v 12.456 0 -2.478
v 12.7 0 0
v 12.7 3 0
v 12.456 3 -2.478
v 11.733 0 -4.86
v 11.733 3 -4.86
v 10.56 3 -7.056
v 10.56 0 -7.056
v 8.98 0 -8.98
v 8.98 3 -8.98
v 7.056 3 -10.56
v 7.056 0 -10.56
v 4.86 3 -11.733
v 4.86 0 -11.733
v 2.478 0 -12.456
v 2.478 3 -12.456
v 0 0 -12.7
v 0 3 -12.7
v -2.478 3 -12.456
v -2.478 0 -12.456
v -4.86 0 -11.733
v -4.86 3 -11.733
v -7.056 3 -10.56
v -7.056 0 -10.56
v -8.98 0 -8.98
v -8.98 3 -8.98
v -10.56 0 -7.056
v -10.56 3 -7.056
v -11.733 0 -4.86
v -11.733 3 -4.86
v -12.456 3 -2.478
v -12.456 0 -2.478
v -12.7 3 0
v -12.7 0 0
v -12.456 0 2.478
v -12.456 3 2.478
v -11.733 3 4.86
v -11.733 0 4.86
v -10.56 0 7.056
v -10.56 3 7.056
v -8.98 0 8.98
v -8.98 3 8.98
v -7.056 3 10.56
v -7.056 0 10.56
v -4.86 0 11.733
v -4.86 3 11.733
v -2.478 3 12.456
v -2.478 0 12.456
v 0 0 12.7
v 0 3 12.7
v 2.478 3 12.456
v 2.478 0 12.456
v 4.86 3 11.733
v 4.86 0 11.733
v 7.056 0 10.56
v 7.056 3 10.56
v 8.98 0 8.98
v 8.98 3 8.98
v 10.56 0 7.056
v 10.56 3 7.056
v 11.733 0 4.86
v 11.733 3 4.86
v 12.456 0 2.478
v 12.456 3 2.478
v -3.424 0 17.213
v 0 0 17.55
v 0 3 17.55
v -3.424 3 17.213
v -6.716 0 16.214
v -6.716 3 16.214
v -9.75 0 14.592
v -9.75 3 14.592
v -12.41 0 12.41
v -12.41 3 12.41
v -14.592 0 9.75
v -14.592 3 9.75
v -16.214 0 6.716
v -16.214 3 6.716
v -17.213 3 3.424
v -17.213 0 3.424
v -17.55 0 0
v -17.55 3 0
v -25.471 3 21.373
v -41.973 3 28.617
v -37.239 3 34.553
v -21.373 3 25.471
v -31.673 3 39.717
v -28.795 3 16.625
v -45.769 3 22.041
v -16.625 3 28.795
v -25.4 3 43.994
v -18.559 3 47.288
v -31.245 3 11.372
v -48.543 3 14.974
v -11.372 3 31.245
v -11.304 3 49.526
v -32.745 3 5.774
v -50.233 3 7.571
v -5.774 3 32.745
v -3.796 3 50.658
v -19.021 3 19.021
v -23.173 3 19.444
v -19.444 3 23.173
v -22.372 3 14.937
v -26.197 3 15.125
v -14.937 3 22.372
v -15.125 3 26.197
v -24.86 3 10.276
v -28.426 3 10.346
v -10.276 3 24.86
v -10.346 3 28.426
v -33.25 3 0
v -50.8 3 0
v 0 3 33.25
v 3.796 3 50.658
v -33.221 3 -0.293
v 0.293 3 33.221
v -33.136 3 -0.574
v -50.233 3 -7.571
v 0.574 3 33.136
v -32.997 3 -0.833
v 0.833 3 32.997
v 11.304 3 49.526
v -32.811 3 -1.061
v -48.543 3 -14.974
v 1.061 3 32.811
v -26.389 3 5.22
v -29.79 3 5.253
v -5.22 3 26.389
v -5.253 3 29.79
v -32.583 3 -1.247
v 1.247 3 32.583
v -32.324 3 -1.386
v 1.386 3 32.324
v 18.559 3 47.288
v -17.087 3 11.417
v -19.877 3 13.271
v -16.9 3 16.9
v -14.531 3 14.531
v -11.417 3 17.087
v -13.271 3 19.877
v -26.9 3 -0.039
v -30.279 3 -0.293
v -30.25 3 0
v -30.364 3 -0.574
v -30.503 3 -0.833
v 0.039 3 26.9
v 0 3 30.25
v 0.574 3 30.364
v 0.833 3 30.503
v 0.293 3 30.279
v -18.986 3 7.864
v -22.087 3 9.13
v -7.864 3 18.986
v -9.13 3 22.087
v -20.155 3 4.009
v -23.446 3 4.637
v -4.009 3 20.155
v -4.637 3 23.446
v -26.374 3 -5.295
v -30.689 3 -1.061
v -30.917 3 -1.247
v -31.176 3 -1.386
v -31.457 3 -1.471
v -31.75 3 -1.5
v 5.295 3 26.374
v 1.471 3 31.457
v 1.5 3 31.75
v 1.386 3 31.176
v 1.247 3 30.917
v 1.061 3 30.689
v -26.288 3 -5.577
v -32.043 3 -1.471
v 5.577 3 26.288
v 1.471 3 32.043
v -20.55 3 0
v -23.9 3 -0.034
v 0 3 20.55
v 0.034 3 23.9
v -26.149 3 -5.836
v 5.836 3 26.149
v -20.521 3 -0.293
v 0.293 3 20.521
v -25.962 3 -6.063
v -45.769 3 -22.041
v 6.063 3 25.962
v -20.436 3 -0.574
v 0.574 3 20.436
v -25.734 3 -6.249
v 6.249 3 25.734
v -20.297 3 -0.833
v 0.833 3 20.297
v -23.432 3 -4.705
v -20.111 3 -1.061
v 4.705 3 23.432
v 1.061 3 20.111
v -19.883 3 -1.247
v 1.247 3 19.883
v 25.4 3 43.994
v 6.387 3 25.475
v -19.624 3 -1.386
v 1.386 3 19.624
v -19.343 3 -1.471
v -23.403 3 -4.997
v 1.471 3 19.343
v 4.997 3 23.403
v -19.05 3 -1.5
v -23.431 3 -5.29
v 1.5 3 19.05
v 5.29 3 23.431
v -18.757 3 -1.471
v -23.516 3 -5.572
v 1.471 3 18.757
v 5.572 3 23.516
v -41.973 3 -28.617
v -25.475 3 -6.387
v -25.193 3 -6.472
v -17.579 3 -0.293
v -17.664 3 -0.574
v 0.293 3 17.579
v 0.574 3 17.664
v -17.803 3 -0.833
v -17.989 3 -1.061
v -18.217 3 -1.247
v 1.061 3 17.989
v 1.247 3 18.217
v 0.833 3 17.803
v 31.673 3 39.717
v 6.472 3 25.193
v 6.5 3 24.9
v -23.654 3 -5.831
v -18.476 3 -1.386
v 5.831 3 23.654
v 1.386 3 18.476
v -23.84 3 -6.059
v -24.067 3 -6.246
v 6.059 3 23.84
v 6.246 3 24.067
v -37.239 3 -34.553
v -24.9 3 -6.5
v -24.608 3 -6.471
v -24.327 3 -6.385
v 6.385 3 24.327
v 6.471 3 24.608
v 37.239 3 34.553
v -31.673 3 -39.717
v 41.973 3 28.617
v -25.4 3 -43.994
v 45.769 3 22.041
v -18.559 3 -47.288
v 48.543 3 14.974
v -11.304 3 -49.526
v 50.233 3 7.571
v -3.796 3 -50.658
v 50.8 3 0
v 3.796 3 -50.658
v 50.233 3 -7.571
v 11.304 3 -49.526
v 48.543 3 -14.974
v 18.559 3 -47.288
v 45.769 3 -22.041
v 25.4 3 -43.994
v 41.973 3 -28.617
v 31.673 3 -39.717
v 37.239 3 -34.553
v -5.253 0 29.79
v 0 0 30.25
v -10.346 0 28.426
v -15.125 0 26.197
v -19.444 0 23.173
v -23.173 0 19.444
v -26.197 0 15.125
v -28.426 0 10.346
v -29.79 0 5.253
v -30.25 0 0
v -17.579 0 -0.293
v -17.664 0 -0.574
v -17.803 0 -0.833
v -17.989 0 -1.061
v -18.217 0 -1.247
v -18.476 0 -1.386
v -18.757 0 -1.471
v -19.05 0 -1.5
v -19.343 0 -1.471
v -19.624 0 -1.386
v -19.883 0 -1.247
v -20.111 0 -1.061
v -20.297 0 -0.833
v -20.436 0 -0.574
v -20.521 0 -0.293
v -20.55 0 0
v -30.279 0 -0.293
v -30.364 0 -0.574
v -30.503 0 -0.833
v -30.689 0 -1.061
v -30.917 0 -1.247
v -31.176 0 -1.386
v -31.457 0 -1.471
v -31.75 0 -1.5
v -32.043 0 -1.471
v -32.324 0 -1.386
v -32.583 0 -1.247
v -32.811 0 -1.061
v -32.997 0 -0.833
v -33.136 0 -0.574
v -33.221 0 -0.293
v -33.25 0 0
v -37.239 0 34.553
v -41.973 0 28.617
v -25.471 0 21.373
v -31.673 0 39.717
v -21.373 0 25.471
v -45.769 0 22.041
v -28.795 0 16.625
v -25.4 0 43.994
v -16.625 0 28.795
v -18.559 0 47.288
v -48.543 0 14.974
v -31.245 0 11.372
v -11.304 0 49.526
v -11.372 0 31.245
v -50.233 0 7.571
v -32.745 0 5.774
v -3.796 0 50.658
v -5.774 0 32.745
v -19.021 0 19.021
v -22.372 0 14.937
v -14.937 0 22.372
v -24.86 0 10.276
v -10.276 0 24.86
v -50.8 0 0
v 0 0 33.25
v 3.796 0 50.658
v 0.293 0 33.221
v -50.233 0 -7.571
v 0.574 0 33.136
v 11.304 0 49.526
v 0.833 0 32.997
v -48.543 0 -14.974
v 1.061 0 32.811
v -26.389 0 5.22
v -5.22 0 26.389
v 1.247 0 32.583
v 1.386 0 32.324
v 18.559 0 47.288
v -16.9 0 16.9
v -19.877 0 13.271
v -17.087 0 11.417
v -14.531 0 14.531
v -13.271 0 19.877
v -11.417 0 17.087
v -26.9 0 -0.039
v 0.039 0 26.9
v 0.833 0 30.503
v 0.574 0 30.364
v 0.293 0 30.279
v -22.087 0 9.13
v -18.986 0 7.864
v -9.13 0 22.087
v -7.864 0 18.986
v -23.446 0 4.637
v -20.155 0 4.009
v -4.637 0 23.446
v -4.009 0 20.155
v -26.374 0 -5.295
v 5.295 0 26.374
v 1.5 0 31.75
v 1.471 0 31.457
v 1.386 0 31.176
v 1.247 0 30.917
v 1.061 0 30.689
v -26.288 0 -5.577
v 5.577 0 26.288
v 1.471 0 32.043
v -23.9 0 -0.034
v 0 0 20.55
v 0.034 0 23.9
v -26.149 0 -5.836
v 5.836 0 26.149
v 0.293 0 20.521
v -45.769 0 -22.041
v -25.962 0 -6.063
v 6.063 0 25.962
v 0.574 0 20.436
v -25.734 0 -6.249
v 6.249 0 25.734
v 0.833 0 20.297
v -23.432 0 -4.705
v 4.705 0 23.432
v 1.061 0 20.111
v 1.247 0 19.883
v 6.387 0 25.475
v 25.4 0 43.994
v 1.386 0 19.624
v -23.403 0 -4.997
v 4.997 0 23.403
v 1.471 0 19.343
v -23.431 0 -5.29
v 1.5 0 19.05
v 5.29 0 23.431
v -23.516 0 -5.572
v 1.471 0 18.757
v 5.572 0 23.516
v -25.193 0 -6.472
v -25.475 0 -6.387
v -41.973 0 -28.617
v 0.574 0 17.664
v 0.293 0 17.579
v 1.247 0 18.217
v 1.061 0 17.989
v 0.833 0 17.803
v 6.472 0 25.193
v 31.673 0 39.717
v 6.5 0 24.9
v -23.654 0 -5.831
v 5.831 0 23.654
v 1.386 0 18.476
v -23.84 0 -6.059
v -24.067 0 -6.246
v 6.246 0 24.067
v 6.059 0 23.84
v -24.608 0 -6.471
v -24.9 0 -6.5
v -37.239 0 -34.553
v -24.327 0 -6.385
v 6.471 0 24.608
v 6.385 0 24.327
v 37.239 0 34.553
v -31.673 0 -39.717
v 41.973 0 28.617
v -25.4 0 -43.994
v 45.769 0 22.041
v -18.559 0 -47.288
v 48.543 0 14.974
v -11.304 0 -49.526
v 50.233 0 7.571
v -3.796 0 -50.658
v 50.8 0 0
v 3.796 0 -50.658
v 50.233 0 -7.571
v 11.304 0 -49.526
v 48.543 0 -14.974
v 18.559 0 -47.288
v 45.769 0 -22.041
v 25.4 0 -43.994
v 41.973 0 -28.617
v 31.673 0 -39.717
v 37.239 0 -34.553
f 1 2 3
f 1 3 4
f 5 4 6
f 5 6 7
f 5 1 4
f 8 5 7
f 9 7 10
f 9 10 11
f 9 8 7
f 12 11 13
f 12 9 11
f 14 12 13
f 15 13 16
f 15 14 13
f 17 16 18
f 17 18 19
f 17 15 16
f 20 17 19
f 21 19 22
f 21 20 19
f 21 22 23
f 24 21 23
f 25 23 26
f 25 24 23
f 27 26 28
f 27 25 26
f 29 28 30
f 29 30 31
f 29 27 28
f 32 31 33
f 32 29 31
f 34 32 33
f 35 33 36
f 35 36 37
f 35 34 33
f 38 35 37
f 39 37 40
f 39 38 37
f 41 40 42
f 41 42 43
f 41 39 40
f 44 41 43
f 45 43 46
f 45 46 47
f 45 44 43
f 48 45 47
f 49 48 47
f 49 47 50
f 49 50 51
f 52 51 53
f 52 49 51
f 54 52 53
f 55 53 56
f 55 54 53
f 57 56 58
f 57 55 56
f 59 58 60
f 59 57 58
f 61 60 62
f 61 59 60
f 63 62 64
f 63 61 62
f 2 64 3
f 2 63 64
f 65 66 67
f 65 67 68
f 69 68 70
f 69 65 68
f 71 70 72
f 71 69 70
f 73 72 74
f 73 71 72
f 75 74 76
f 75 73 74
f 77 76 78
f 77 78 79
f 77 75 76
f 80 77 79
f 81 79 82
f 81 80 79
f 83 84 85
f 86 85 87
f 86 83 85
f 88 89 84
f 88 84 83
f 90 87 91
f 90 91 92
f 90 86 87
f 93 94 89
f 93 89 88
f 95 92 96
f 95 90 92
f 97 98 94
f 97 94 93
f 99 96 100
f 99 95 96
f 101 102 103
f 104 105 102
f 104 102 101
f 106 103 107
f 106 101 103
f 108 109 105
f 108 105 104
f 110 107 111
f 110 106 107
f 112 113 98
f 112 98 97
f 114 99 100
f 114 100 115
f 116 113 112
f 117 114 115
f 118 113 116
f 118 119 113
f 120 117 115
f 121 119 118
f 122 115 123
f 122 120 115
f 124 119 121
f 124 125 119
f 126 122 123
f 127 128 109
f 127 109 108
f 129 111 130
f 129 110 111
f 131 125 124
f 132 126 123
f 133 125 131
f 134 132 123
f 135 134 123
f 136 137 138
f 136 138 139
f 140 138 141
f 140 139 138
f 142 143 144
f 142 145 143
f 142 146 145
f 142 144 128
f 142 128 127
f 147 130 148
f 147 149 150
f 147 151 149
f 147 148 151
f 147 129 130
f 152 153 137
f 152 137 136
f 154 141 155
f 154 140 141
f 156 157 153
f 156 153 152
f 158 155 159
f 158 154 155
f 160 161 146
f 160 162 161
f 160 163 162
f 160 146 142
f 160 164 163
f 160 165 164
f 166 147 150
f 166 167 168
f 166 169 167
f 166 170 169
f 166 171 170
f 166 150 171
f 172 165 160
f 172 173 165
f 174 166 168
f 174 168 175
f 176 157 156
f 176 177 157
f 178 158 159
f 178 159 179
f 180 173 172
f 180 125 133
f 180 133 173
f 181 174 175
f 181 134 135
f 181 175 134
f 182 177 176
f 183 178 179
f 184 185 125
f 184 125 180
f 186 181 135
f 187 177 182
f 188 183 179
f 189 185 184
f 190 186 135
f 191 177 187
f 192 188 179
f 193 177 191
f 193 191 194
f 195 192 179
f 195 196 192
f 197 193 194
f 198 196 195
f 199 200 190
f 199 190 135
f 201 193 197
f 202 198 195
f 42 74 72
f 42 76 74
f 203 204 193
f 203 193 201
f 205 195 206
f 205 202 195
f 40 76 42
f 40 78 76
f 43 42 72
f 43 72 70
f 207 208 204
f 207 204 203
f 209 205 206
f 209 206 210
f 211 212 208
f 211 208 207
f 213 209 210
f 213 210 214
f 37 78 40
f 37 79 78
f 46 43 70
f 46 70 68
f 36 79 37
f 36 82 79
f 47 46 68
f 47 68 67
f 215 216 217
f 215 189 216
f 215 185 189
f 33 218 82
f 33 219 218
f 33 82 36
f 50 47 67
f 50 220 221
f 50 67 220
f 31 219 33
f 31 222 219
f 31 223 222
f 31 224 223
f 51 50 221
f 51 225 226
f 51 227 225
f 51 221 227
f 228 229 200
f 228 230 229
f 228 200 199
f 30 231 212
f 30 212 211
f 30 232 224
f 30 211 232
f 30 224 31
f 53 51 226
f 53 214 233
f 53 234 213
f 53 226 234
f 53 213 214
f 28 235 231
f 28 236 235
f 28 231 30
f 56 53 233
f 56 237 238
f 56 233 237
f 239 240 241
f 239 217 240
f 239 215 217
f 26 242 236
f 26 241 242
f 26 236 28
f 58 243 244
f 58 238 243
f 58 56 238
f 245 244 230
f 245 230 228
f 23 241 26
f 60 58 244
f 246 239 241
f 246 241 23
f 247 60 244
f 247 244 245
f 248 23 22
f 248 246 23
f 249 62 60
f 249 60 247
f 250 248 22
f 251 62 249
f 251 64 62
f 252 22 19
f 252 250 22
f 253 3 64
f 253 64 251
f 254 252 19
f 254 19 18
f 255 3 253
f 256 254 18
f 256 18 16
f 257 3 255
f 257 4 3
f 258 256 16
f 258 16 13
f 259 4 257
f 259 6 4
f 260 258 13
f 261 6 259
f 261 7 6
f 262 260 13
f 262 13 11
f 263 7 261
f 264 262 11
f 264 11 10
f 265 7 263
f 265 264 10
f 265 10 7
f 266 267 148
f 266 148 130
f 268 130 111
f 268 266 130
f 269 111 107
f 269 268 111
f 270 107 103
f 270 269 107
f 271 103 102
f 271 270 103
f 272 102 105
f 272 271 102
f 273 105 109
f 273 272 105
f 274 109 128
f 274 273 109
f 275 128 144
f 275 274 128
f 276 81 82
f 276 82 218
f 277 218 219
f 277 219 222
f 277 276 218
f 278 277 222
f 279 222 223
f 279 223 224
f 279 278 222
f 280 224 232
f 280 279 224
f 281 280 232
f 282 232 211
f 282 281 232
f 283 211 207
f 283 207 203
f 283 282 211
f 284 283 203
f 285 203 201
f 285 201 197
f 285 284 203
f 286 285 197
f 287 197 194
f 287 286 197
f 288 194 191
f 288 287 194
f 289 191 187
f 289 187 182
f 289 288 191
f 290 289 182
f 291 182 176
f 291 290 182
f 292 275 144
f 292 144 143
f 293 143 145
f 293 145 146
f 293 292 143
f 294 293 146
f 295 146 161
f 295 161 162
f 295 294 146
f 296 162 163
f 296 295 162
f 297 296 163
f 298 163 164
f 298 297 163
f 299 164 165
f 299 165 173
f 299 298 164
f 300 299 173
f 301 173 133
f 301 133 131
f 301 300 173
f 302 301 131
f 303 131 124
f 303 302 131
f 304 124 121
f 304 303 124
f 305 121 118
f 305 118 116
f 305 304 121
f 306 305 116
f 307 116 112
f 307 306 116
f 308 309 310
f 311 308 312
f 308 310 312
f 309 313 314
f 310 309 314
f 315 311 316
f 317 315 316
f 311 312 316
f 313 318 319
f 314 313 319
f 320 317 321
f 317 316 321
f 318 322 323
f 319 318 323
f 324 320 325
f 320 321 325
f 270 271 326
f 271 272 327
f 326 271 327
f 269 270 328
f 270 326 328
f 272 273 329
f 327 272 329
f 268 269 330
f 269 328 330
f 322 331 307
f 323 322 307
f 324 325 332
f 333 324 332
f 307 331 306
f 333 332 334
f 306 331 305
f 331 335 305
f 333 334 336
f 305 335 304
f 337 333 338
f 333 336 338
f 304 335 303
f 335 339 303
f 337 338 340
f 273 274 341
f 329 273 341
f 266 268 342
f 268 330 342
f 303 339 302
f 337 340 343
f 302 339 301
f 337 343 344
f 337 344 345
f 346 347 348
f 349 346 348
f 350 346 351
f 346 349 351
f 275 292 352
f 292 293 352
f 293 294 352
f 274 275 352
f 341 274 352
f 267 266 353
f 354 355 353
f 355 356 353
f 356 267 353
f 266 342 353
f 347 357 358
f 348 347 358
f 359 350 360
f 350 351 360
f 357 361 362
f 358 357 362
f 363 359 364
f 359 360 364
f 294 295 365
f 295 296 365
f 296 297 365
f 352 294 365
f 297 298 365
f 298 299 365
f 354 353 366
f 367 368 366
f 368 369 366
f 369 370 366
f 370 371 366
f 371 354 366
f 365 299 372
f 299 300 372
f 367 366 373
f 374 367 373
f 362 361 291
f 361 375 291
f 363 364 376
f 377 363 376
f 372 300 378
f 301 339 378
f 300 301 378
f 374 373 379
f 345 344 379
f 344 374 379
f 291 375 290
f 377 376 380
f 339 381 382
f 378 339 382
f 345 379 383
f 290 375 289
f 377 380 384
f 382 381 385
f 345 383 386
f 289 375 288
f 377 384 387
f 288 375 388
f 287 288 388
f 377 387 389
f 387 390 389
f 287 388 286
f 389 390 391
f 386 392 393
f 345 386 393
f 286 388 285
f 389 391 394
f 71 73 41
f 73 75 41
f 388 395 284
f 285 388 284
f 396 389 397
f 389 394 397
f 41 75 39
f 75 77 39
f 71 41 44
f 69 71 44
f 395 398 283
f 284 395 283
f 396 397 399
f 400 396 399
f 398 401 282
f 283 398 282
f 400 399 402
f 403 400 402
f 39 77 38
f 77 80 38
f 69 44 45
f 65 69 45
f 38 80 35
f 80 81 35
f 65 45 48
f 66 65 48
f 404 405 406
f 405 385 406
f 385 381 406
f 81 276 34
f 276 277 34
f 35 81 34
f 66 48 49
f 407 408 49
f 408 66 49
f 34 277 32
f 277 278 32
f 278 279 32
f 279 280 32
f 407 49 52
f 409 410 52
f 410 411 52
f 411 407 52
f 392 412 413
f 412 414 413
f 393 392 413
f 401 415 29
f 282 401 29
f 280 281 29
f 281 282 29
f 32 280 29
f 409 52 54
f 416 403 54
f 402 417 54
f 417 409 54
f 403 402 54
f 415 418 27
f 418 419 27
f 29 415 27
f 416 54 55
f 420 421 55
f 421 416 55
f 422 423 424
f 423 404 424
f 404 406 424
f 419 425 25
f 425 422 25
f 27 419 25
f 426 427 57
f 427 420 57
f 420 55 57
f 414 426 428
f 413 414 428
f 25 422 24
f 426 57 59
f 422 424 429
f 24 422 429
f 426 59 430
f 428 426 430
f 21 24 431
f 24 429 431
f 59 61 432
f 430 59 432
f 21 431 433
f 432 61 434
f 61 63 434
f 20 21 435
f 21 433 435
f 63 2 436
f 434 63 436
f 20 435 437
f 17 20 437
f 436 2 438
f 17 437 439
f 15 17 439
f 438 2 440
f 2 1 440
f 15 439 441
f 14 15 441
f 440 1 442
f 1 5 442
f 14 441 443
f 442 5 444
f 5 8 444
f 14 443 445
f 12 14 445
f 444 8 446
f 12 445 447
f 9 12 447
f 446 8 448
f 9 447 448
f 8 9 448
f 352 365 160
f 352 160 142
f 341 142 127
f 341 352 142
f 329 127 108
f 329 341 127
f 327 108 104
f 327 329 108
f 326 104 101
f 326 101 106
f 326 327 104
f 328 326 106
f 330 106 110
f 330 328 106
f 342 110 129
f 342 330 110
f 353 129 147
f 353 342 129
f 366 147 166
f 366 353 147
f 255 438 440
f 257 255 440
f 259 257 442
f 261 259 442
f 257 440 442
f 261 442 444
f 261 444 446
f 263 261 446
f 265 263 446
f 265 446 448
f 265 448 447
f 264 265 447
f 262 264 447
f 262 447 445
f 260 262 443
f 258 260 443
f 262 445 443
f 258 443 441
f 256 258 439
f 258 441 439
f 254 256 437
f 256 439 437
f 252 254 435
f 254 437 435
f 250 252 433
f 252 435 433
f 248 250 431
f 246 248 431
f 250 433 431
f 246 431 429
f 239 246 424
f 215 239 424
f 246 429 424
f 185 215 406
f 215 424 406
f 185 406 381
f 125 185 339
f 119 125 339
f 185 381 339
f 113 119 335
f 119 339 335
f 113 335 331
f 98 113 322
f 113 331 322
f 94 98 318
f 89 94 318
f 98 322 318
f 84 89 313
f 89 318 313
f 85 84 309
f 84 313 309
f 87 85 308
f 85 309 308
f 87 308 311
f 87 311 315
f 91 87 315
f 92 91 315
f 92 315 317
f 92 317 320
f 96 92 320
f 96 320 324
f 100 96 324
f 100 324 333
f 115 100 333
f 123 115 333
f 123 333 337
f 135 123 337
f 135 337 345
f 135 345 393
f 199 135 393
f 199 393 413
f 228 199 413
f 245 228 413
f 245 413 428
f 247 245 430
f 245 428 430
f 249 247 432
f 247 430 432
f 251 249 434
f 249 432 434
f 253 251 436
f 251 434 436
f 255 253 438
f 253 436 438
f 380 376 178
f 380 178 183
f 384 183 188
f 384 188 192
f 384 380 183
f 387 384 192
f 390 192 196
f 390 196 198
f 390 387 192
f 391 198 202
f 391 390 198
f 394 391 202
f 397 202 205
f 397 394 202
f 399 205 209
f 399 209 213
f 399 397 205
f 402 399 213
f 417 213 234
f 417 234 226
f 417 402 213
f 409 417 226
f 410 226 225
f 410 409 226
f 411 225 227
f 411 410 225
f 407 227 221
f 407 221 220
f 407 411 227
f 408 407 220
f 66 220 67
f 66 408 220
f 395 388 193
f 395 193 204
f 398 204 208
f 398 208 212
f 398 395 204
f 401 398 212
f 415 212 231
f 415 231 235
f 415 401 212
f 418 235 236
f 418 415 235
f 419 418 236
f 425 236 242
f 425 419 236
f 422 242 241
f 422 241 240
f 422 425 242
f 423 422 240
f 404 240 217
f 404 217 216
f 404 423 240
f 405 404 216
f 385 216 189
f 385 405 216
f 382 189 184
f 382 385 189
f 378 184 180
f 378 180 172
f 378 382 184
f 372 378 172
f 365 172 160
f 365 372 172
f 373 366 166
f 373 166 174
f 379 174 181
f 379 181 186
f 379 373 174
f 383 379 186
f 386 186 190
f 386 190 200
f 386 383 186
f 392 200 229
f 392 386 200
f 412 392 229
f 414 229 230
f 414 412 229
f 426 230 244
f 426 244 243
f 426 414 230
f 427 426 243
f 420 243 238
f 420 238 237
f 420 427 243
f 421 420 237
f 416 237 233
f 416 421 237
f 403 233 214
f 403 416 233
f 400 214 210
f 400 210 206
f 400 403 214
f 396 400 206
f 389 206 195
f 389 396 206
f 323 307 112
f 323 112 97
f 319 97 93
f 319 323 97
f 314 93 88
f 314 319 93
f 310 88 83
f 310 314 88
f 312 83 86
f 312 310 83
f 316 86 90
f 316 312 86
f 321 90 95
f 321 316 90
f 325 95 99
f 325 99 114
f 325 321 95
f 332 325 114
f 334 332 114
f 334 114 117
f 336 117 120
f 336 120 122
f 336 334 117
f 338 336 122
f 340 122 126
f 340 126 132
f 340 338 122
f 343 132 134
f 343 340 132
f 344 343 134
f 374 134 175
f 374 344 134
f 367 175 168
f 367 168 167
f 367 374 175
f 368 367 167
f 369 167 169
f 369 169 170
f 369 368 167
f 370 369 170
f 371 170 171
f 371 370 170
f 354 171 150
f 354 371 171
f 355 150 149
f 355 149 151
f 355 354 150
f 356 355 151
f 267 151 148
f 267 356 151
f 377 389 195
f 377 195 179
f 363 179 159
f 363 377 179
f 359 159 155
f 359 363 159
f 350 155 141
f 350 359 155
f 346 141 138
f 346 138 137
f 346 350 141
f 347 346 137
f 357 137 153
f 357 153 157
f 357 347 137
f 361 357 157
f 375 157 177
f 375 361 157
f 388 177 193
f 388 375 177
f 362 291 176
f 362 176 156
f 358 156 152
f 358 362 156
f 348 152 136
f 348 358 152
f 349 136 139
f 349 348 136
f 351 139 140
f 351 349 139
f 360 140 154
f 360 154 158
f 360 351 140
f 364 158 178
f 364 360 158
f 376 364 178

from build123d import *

# Parameters (mm, degrees)
SKETCH1_R           = 50.8
SKETCH1_R_2         = 12.7
BOSS_EXTRUDE1_DEPTH = 3


with BuildPart() as part:
    # Sketch1 → Boss-Extrude1 (new body)
    with BuildSketch(Plane(origin=(0, 0, 0), x_dir=(1, 0, 0), z_dir=(0, 1, 0))):
        Circle(SKETCH1_R)
        Circle(SKETCH1_R_2, mode=Mode.SUBTRACT)
        with BuildLine():
            ThreePointArc((-33.25, 0), (-23.511300474, -23.511300474), (0, -33.25))
            ThreePointArc((0, -33.25), (1.5, -31.75), (0, -30.25))
            ThreePointArc((0, -30.25), (-21.389980131, -21.389980131), (-30.25, 0))
            ThreePointArc((-30.25, 0), (-31.75, 1.5), (-33.25, 0))
        make_face(mode=Mode.SUBTRACT)
        with BuildLine():
            ThreePointArc((-26.373662173, 5.295275591), (-19.021172414, -19.021172414), (5.295275591, -26.373662173))
            ThreePointArc((5.295275591, -26.373662173), (6.470650307, -24.607736275), (4.704724409, -23.432361559))
            ThreePointArc((4.704724409, -23.432361559), (-16.89985207, -16.89985207), (-23.432361559, 4.704724409))
            ThreePointArc((-23.432361559, 4.704724409), (-24.607736275, 6.470650307), (-26.373662173, 5.295275591))
        make_face(mode=Mode.SUBTRACT)
        with BuildLine():
            ThreePointArc((-20.55, 0), (-14.531044353, -14.531044353), (0, -20.55))
            ThreePointArc((0, -20.55), (1.5, -19.05), (0, -17.55))
            ThreePointArc((0, -17.55), (-12.40972401, -12.40972401), (-17.55, 0))
            ThreePointArc((-17.55, 0), (-19.05, 1.5), (-20.55, 0))
        make_face(mode=Mode.SUBTRACT)
    extrude(amount=BOSS_EXTRUDE1_DEPTH)


solid = part.part
